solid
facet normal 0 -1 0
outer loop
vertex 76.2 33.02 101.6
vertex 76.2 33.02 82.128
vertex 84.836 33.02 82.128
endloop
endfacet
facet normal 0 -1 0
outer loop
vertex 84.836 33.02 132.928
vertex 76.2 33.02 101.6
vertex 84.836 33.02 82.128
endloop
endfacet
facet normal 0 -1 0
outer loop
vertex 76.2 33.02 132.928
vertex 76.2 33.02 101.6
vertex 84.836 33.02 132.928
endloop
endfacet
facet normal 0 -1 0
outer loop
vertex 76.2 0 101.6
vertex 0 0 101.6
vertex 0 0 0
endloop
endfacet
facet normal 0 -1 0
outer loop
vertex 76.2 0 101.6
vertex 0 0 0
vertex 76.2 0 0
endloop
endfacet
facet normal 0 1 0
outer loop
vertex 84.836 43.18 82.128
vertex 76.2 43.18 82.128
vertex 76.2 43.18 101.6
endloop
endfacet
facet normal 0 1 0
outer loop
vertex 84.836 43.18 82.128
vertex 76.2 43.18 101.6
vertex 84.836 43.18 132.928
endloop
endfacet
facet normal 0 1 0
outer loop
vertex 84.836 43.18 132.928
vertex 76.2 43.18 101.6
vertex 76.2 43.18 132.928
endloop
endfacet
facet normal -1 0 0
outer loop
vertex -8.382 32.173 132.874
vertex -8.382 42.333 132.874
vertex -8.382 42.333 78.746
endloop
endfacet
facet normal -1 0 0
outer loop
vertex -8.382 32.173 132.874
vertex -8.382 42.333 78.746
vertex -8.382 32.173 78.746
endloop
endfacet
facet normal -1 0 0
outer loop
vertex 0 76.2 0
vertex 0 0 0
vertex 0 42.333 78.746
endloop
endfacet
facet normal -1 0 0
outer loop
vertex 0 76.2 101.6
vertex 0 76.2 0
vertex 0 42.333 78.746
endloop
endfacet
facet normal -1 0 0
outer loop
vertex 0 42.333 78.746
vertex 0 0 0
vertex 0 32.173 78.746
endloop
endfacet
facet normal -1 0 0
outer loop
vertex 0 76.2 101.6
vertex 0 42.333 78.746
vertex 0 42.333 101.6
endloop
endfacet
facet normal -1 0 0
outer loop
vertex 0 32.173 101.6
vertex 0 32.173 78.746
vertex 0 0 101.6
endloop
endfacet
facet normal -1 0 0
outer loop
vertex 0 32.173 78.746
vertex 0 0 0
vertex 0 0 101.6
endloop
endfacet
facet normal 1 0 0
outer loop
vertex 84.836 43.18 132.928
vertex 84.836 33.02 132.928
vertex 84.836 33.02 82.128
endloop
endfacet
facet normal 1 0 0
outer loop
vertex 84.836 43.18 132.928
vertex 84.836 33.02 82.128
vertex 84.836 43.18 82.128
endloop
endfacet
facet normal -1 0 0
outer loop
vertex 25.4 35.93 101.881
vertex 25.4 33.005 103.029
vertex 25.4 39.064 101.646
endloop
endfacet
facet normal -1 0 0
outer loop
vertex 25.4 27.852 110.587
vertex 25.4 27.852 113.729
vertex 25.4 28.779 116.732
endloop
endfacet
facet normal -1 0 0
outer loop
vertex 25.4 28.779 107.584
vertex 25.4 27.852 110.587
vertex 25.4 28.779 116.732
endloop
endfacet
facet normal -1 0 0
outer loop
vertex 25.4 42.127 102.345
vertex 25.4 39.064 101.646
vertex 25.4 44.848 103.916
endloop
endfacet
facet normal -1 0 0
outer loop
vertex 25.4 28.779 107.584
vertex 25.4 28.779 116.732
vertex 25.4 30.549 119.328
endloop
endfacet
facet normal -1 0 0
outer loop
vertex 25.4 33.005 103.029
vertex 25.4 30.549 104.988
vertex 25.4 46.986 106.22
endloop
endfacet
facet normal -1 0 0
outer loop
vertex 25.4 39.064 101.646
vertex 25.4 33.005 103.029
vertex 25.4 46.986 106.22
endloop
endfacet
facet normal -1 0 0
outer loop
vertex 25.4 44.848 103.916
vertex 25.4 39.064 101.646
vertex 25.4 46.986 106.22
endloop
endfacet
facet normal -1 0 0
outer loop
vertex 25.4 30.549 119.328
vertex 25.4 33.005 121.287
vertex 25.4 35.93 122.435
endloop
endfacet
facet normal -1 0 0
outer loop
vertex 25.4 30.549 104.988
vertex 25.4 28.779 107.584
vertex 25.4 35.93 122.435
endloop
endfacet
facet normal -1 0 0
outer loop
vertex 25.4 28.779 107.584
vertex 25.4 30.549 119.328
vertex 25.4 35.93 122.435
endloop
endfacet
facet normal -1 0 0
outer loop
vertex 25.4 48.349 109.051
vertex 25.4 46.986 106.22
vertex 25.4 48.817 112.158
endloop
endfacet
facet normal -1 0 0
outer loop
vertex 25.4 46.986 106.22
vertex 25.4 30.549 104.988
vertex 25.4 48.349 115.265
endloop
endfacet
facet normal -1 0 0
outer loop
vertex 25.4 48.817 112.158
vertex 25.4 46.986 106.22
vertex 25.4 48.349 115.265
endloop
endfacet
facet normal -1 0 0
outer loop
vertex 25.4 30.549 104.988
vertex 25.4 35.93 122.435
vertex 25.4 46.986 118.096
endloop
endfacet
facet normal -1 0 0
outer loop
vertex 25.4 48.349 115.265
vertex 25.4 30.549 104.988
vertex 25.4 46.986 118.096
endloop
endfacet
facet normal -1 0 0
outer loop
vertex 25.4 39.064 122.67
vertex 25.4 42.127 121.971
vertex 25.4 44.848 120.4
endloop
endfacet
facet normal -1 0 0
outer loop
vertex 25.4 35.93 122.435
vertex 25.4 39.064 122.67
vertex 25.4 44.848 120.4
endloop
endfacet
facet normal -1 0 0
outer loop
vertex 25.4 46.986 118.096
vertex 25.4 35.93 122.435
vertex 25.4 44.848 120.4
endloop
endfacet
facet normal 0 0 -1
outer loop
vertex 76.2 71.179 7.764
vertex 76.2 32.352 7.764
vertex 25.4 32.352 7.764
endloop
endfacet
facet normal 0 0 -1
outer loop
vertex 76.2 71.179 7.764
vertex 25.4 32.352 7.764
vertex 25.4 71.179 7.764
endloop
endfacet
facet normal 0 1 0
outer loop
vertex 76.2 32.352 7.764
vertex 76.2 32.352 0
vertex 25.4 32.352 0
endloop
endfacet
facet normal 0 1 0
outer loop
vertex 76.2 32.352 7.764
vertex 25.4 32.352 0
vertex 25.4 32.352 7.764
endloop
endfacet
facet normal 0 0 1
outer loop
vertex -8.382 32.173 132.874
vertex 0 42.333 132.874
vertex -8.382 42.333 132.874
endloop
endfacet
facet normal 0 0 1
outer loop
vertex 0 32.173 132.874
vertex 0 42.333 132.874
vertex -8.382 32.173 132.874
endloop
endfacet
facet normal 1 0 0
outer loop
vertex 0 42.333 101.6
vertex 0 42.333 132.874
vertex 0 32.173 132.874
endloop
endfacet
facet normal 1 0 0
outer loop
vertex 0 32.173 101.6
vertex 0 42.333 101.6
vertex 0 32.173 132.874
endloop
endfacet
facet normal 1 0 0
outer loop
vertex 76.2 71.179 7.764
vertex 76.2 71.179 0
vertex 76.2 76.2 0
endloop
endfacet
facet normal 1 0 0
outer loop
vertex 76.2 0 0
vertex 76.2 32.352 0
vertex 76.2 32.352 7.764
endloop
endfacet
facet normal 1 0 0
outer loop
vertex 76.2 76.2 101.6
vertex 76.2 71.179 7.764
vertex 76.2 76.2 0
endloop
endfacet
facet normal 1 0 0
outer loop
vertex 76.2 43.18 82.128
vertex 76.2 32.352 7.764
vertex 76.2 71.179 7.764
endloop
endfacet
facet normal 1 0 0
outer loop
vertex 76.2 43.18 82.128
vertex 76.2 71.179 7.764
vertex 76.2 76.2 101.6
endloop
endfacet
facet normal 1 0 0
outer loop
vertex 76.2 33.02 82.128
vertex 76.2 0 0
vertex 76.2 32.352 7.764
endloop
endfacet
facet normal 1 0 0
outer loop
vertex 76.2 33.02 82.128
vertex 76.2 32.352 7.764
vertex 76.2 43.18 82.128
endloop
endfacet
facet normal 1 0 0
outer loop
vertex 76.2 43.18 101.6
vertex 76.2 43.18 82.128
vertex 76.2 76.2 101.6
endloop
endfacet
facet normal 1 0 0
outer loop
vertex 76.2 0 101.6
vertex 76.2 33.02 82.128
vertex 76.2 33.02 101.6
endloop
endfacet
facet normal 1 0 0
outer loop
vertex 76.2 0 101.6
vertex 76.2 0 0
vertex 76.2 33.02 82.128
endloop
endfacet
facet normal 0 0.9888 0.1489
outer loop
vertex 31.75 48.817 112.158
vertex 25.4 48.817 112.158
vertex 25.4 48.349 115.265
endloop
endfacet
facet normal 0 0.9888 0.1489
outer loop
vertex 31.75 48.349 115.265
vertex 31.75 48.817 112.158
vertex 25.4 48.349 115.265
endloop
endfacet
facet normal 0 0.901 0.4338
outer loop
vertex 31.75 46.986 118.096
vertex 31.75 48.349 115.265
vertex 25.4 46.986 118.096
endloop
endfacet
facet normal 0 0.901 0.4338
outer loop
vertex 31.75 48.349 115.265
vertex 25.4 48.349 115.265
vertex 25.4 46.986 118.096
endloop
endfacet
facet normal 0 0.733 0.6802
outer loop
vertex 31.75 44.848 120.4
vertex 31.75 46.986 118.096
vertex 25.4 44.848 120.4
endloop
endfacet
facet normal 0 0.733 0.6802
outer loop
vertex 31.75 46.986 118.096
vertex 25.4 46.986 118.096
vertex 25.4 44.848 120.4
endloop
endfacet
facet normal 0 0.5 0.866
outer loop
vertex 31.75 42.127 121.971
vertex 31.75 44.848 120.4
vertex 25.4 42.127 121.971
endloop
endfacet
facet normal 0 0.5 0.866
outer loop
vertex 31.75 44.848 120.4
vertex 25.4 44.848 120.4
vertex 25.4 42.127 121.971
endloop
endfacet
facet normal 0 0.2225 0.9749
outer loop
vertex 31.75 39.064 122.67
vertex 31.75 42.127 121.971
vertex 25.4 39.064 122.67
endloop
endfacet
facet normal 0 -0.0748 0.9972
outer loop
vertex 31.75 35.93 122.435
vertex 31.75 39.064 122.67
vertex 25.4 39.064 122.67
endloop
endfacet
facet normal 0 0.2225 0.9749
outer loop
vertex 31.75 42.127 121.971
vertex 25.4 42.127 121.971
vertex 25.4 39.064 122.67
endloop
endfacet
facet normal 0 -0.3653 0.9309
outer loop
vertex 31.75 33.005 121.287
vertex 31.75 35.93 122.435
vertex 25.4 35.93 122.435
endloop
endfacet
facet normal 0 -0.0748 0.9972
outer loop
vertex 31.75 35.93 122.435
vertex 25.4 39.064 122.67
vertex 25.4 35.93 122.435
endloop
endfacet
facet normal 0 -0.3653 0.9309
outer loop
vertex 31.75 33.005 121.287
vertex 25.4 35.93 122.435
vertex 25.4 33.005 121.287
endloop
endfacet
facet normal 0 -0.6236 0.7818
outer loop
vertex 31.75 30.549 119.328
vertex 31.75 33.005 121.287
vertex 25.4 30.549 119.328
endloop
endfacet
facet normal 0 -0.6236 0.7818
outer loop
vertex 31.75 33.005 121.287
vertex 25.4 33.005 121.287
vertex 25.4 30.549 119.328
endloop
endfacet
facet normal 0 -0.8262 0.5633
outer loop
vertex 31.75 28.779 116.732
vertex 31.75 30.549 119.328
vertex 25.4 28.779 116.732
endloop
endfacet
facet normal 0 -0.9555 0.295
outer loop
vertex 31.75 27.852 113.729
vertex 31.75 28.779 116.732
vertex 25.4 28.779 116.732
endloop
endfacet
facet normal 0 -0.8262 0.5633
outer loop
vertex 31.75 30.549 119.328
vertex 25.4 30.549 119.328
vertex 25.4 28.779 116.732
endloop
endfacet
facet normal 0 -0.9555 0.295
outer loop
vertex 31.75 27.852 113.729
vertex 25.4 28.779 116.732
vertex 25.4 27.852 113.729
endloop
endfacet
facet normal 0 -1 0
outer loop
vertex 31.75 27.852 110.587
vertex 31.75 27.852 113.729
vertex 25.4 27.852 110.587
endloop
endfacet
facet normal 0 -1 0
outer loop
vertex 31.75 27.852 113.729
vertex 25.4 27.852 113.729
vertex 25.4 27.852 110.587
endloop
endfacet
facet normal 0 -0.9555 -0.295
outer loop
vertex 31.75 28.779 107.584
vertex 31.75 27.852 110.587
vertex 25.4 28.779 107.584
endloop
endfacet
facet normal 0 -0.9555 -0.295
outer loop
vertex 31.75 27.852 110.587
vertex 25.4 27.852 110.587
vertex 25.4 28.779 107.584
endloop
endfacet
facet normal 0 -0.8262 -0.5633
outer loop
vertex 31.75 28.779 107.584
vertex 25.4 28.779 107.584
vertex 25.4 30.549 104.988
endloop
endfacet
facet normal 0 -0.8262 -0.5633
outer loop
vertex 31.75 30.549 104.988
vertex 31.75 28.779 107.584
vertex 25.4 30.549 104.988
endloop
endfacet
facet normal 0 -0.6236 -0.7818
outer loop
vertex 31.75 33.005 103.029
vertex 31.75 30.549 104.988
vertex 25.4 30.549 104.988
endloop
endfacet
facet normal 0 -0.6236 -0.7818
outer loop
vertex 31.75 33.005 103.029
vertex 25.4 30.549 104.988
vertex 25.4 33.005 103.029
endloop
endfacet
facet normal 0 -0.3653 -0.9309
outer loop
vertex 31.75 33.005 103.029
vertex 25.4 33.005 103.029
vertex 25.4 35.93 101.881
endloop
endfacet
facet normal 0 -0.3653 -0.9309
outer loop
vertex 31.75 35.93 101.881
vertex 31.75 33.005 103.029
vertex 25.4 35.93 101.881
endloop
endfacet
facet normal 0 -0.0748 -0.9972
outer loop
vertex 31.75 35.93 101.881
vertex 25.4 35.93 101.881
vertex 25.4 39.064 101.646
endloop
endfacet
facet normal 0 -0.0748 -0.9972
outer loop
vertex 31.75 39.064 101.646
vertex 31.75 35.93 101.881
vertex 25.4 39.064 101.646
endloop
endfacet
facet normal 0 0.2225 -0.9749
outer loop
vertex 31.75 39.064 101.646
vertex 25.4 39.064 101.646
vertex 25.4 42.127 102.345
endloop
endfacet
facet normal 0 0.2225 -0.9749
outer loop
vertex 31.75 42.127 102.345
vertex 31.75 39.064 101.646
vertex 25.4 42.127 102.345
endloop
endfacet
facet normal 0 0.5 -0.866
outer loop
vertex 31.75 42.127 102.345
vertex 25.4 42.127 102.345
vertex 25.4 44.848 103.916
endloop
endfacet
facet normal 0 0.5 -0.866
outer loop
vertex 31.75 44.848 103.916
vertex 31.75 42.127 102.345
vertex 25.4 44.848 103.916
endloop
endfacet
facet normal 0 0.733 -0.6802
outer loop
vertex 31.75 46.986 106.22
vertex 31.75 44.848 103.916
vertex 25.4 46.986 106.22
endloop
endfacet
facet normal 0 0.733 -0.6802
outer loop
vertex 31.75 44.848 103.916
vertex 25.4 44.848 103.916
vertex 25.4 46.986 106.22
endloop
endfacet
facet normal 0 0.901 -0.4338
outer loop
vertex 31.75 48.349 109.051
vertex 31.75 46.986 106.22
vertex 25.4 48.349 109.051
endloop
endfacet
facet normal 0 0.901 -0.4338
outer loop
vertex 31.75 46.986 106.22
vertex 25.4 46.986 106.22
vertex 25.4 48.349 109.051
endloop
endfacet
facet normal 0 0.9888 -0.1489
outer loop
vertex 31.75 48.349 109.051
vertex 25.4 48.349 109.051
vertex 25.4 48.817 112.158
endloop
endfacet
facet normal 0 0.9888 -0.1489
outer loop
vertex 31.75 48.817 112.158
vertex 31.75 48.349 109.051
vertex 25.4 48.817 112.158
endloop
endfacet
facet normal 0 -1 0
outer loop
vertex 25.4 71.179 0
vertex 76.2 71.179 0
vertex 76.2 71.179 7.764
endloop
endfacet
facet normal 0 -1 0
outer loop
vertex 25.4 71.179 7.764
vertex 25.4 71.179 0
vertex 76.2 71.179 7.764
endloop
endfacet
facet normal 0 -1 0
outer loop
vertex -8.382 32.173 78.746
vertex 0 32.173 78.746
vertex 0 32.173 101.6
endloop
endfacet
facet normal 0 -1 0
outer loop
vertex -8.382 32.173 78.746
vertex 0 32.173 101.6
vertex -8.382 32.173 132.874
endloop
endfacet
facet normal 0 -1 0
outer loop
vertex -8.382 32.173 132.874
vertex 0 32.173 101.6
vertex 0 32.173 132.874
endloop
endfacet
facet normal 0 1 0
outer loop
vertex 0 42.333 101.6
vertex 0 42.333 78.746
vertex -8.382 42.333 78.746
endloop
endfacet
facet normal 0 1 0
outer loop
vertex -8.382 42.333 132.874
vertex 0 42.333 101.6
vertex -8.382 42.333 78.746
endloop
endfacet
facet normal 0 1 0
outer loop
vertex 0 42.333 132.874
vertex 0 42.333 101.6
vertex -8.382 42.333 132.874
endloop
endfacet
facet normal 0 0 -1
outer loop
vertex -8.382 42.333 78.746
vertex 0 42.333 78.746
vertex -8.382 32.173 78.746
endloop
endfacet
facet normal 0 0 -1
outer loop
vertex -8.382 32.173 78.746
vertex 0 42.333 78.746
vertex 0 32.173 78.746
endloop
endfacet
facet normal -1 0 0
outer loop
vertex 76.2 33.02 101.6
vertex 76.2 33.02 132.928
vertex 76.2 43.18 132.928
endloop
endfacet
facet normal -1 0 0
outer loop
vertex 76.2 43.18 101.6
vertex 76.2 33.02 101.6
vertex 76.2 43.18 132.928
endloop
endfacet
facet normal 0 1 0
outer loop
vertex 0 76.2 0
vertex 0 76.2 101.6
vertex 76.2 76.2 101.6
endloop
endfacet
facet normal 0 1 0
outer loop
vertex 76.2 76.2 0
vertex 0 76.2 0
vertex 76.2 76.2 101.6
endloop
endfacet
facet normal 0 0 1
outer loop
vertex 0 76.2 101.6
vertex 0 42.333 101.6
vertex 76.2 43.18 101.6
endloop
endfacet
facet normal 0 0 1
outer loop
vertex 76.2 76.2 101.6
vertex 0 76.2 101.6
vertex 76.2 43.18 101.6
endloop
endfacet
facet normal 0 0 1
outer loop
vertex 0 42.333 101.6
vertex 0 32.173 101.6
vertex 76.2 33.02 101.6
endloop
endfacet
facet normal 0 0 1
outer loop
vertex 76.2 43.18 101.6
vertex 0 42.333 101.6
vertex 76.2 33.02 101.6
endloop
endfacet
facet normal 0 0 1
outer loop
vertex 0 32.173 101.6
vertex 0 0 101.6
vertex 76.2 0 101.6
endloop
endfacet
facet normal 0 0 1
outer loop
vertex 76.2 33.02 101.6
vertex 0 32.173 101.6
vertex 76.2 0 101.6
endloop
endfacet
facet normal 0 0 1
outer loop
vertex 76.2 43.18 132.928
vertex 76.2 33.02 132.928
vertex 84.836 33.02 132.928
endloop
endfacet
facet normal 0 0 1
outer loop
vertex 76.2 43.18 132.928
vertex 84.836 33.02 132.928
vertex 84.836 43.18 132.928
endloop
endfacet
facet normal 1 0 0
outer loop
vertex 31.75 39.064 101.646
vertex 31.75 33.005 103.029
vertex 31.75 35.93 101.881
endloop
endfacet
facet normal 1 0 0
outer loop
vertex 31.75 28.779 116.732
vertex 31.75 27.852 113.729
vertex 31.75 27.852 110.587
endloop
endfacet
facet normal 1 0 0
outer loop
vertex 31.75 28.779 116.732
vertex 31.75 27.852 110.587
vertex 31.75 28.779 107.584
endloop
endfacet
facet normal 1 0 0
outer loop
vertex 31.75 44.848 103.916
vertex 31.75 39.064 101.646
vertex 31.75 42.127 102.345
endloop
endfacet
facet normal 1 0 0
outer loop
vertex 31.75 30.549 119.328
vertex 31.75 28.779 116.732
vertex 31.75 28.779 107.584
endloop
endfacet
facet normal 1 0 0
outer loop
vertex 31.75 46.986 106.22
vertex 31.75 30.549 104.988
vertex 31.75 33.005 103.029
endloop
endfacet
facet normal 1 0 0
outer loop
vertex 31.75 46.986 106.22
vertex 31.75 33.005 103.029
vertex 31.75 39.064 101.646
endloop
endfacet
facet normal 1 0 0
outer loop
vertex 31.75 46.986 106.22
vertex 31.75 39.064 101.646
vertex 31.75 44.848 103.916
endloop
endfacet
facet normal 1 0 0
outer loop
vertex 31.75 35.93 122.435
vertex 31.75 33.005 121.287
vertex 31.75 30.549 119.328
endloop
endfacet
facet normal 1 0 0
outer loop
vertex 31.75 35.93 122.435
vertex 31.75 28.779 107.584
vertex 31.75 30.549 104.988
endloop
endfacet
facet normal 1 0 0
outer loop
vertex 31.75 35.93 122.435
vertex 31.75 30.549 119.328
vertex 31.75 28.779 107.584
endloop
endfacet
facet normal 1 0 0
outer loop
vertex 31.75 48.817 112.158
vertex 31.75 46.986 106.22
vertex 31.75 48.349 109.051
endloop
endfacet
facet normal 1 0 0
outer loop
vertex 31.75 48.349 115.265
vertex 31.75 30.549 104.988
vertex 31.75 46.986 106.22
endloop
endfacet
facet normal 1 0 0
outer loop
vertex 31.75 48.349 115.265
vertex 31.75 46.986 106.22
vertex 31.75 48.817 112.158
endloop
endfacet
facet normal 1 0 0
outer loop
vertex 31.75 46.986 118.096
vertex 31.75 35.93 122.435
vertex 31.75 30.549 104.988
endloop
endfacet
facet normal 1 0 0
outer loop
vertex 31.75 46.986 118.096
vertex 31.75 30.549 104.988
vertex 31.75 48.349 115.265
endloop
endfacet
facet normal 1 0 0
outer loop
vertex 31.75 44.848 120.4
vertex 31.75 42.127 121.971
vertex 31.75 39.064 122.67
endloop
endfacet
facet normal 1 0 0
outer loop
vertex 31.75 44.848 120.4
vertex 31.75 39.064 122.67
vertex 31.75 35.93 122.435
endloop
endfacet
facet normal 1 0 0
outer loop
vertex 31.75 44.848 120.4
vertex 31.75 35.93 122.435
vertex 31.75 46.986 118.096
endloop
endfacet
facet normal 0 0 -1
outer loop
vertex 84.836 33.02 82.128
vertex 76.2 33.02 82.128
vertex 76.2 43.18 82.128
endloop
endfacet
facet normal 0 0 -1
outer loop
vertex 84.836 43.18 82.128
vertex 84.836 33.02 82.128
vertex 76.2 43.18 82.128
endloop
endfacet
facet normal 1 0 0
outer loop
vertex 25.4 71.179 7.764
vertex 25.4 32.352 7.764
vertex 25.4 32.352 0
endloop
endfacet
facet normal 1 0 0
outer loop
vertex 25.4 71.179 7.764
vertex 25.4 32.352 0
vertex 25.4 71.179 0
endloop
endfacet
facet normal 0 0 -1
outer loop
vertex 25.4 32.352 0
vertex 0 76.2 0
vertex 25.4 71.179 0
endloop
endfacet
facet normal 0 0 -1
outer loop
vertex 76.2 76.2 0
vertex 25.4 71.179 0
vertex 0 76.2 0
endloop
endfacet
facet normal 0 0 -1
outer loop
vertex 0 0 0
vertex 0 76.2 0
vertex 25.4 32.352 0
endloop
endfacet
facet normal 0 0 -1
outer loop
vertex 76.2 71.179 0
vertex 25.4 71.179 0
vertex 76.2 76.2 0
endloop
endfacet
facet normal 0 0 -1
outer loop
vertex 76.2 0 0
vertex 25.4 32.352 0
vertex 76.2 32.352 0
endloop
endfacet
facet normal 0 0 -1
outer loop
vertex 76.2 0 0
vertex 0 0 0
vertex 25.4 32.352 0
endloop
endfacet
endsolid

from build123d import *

# Parameters (mm, degrees)
F0_W      = 76.2
F0_H      = 101.6
F1_DEPTH  = 76.2
F2_DEPTH  = 76.2
F3_W      = 10.16
F3_H      = 50.8
F4_DEPTH  = 8.636
F5_W      = 10.16
F5_H      = 54.12841
F6_DEPTH  = 8.382
F7_W      = 38.827151
F7_H      = 7.764305
F8_DEPTH  = 50.8
F10_R     = 10.541303
F11_DEPTH = 6.35


with BuildPart() as f1:
    # F0 (on Front) → F1 (new body)
    with BuildSketch(Plane.XZ):
        with Locations((38.1, 50.8)):
            Rectangle(F0_W, F0_H)
    extrude(amount=-F1_DEPTH)

    # F0 (on Front) → F2 (join)
    with BuildSketch(Plane.XZ):
        with Locations((38.1, 50.8)):
            Rectangle(F0_W, F0_H)
    extrude(amount=-F2_DEPTH)

    # F3 (on face) → F4 (join)
    with BuildSketch(Plane.YZ.offset(76.2)):
        with Locations((38.1, 107.528254)):
            Rectangle(F3_W, F3_H)
    extrude(amount=F4_DEPTH)

    # F5 (on face) → F6 (join)
    with BuildSketch(Plane(origin=(0, 0, 0), x_dir=(0, -1, 0), z_dir=(-1, 0, 0))):
        with Locations((-37.253136, 105.810075)):
            Rectangle(F5_W, F5_H)
    extrude(amount=F6_DEPTH)

    # F7 (on face) → F8 (cut)
    with BuildSketch(Plane.YZ.offset(76.2)):
        with Locations((51.76542, 3.882152)):
            Rectangle(F7_W, F7_H)
    extrude(amount=-F8_DEPTH, mode=Mode.SUBTRACT)


with BuildPart() as f11:
    # F10 (on offset) → F11 (new body)
    with BuildSketch(Plane.YZ.offset(25.4)):
        with Locations((38.275972, 112.158)):
            Circle(F10_R)
    extrude(amount=F11_DEPTH)


solid = Compound([f1.part, f11.part])
